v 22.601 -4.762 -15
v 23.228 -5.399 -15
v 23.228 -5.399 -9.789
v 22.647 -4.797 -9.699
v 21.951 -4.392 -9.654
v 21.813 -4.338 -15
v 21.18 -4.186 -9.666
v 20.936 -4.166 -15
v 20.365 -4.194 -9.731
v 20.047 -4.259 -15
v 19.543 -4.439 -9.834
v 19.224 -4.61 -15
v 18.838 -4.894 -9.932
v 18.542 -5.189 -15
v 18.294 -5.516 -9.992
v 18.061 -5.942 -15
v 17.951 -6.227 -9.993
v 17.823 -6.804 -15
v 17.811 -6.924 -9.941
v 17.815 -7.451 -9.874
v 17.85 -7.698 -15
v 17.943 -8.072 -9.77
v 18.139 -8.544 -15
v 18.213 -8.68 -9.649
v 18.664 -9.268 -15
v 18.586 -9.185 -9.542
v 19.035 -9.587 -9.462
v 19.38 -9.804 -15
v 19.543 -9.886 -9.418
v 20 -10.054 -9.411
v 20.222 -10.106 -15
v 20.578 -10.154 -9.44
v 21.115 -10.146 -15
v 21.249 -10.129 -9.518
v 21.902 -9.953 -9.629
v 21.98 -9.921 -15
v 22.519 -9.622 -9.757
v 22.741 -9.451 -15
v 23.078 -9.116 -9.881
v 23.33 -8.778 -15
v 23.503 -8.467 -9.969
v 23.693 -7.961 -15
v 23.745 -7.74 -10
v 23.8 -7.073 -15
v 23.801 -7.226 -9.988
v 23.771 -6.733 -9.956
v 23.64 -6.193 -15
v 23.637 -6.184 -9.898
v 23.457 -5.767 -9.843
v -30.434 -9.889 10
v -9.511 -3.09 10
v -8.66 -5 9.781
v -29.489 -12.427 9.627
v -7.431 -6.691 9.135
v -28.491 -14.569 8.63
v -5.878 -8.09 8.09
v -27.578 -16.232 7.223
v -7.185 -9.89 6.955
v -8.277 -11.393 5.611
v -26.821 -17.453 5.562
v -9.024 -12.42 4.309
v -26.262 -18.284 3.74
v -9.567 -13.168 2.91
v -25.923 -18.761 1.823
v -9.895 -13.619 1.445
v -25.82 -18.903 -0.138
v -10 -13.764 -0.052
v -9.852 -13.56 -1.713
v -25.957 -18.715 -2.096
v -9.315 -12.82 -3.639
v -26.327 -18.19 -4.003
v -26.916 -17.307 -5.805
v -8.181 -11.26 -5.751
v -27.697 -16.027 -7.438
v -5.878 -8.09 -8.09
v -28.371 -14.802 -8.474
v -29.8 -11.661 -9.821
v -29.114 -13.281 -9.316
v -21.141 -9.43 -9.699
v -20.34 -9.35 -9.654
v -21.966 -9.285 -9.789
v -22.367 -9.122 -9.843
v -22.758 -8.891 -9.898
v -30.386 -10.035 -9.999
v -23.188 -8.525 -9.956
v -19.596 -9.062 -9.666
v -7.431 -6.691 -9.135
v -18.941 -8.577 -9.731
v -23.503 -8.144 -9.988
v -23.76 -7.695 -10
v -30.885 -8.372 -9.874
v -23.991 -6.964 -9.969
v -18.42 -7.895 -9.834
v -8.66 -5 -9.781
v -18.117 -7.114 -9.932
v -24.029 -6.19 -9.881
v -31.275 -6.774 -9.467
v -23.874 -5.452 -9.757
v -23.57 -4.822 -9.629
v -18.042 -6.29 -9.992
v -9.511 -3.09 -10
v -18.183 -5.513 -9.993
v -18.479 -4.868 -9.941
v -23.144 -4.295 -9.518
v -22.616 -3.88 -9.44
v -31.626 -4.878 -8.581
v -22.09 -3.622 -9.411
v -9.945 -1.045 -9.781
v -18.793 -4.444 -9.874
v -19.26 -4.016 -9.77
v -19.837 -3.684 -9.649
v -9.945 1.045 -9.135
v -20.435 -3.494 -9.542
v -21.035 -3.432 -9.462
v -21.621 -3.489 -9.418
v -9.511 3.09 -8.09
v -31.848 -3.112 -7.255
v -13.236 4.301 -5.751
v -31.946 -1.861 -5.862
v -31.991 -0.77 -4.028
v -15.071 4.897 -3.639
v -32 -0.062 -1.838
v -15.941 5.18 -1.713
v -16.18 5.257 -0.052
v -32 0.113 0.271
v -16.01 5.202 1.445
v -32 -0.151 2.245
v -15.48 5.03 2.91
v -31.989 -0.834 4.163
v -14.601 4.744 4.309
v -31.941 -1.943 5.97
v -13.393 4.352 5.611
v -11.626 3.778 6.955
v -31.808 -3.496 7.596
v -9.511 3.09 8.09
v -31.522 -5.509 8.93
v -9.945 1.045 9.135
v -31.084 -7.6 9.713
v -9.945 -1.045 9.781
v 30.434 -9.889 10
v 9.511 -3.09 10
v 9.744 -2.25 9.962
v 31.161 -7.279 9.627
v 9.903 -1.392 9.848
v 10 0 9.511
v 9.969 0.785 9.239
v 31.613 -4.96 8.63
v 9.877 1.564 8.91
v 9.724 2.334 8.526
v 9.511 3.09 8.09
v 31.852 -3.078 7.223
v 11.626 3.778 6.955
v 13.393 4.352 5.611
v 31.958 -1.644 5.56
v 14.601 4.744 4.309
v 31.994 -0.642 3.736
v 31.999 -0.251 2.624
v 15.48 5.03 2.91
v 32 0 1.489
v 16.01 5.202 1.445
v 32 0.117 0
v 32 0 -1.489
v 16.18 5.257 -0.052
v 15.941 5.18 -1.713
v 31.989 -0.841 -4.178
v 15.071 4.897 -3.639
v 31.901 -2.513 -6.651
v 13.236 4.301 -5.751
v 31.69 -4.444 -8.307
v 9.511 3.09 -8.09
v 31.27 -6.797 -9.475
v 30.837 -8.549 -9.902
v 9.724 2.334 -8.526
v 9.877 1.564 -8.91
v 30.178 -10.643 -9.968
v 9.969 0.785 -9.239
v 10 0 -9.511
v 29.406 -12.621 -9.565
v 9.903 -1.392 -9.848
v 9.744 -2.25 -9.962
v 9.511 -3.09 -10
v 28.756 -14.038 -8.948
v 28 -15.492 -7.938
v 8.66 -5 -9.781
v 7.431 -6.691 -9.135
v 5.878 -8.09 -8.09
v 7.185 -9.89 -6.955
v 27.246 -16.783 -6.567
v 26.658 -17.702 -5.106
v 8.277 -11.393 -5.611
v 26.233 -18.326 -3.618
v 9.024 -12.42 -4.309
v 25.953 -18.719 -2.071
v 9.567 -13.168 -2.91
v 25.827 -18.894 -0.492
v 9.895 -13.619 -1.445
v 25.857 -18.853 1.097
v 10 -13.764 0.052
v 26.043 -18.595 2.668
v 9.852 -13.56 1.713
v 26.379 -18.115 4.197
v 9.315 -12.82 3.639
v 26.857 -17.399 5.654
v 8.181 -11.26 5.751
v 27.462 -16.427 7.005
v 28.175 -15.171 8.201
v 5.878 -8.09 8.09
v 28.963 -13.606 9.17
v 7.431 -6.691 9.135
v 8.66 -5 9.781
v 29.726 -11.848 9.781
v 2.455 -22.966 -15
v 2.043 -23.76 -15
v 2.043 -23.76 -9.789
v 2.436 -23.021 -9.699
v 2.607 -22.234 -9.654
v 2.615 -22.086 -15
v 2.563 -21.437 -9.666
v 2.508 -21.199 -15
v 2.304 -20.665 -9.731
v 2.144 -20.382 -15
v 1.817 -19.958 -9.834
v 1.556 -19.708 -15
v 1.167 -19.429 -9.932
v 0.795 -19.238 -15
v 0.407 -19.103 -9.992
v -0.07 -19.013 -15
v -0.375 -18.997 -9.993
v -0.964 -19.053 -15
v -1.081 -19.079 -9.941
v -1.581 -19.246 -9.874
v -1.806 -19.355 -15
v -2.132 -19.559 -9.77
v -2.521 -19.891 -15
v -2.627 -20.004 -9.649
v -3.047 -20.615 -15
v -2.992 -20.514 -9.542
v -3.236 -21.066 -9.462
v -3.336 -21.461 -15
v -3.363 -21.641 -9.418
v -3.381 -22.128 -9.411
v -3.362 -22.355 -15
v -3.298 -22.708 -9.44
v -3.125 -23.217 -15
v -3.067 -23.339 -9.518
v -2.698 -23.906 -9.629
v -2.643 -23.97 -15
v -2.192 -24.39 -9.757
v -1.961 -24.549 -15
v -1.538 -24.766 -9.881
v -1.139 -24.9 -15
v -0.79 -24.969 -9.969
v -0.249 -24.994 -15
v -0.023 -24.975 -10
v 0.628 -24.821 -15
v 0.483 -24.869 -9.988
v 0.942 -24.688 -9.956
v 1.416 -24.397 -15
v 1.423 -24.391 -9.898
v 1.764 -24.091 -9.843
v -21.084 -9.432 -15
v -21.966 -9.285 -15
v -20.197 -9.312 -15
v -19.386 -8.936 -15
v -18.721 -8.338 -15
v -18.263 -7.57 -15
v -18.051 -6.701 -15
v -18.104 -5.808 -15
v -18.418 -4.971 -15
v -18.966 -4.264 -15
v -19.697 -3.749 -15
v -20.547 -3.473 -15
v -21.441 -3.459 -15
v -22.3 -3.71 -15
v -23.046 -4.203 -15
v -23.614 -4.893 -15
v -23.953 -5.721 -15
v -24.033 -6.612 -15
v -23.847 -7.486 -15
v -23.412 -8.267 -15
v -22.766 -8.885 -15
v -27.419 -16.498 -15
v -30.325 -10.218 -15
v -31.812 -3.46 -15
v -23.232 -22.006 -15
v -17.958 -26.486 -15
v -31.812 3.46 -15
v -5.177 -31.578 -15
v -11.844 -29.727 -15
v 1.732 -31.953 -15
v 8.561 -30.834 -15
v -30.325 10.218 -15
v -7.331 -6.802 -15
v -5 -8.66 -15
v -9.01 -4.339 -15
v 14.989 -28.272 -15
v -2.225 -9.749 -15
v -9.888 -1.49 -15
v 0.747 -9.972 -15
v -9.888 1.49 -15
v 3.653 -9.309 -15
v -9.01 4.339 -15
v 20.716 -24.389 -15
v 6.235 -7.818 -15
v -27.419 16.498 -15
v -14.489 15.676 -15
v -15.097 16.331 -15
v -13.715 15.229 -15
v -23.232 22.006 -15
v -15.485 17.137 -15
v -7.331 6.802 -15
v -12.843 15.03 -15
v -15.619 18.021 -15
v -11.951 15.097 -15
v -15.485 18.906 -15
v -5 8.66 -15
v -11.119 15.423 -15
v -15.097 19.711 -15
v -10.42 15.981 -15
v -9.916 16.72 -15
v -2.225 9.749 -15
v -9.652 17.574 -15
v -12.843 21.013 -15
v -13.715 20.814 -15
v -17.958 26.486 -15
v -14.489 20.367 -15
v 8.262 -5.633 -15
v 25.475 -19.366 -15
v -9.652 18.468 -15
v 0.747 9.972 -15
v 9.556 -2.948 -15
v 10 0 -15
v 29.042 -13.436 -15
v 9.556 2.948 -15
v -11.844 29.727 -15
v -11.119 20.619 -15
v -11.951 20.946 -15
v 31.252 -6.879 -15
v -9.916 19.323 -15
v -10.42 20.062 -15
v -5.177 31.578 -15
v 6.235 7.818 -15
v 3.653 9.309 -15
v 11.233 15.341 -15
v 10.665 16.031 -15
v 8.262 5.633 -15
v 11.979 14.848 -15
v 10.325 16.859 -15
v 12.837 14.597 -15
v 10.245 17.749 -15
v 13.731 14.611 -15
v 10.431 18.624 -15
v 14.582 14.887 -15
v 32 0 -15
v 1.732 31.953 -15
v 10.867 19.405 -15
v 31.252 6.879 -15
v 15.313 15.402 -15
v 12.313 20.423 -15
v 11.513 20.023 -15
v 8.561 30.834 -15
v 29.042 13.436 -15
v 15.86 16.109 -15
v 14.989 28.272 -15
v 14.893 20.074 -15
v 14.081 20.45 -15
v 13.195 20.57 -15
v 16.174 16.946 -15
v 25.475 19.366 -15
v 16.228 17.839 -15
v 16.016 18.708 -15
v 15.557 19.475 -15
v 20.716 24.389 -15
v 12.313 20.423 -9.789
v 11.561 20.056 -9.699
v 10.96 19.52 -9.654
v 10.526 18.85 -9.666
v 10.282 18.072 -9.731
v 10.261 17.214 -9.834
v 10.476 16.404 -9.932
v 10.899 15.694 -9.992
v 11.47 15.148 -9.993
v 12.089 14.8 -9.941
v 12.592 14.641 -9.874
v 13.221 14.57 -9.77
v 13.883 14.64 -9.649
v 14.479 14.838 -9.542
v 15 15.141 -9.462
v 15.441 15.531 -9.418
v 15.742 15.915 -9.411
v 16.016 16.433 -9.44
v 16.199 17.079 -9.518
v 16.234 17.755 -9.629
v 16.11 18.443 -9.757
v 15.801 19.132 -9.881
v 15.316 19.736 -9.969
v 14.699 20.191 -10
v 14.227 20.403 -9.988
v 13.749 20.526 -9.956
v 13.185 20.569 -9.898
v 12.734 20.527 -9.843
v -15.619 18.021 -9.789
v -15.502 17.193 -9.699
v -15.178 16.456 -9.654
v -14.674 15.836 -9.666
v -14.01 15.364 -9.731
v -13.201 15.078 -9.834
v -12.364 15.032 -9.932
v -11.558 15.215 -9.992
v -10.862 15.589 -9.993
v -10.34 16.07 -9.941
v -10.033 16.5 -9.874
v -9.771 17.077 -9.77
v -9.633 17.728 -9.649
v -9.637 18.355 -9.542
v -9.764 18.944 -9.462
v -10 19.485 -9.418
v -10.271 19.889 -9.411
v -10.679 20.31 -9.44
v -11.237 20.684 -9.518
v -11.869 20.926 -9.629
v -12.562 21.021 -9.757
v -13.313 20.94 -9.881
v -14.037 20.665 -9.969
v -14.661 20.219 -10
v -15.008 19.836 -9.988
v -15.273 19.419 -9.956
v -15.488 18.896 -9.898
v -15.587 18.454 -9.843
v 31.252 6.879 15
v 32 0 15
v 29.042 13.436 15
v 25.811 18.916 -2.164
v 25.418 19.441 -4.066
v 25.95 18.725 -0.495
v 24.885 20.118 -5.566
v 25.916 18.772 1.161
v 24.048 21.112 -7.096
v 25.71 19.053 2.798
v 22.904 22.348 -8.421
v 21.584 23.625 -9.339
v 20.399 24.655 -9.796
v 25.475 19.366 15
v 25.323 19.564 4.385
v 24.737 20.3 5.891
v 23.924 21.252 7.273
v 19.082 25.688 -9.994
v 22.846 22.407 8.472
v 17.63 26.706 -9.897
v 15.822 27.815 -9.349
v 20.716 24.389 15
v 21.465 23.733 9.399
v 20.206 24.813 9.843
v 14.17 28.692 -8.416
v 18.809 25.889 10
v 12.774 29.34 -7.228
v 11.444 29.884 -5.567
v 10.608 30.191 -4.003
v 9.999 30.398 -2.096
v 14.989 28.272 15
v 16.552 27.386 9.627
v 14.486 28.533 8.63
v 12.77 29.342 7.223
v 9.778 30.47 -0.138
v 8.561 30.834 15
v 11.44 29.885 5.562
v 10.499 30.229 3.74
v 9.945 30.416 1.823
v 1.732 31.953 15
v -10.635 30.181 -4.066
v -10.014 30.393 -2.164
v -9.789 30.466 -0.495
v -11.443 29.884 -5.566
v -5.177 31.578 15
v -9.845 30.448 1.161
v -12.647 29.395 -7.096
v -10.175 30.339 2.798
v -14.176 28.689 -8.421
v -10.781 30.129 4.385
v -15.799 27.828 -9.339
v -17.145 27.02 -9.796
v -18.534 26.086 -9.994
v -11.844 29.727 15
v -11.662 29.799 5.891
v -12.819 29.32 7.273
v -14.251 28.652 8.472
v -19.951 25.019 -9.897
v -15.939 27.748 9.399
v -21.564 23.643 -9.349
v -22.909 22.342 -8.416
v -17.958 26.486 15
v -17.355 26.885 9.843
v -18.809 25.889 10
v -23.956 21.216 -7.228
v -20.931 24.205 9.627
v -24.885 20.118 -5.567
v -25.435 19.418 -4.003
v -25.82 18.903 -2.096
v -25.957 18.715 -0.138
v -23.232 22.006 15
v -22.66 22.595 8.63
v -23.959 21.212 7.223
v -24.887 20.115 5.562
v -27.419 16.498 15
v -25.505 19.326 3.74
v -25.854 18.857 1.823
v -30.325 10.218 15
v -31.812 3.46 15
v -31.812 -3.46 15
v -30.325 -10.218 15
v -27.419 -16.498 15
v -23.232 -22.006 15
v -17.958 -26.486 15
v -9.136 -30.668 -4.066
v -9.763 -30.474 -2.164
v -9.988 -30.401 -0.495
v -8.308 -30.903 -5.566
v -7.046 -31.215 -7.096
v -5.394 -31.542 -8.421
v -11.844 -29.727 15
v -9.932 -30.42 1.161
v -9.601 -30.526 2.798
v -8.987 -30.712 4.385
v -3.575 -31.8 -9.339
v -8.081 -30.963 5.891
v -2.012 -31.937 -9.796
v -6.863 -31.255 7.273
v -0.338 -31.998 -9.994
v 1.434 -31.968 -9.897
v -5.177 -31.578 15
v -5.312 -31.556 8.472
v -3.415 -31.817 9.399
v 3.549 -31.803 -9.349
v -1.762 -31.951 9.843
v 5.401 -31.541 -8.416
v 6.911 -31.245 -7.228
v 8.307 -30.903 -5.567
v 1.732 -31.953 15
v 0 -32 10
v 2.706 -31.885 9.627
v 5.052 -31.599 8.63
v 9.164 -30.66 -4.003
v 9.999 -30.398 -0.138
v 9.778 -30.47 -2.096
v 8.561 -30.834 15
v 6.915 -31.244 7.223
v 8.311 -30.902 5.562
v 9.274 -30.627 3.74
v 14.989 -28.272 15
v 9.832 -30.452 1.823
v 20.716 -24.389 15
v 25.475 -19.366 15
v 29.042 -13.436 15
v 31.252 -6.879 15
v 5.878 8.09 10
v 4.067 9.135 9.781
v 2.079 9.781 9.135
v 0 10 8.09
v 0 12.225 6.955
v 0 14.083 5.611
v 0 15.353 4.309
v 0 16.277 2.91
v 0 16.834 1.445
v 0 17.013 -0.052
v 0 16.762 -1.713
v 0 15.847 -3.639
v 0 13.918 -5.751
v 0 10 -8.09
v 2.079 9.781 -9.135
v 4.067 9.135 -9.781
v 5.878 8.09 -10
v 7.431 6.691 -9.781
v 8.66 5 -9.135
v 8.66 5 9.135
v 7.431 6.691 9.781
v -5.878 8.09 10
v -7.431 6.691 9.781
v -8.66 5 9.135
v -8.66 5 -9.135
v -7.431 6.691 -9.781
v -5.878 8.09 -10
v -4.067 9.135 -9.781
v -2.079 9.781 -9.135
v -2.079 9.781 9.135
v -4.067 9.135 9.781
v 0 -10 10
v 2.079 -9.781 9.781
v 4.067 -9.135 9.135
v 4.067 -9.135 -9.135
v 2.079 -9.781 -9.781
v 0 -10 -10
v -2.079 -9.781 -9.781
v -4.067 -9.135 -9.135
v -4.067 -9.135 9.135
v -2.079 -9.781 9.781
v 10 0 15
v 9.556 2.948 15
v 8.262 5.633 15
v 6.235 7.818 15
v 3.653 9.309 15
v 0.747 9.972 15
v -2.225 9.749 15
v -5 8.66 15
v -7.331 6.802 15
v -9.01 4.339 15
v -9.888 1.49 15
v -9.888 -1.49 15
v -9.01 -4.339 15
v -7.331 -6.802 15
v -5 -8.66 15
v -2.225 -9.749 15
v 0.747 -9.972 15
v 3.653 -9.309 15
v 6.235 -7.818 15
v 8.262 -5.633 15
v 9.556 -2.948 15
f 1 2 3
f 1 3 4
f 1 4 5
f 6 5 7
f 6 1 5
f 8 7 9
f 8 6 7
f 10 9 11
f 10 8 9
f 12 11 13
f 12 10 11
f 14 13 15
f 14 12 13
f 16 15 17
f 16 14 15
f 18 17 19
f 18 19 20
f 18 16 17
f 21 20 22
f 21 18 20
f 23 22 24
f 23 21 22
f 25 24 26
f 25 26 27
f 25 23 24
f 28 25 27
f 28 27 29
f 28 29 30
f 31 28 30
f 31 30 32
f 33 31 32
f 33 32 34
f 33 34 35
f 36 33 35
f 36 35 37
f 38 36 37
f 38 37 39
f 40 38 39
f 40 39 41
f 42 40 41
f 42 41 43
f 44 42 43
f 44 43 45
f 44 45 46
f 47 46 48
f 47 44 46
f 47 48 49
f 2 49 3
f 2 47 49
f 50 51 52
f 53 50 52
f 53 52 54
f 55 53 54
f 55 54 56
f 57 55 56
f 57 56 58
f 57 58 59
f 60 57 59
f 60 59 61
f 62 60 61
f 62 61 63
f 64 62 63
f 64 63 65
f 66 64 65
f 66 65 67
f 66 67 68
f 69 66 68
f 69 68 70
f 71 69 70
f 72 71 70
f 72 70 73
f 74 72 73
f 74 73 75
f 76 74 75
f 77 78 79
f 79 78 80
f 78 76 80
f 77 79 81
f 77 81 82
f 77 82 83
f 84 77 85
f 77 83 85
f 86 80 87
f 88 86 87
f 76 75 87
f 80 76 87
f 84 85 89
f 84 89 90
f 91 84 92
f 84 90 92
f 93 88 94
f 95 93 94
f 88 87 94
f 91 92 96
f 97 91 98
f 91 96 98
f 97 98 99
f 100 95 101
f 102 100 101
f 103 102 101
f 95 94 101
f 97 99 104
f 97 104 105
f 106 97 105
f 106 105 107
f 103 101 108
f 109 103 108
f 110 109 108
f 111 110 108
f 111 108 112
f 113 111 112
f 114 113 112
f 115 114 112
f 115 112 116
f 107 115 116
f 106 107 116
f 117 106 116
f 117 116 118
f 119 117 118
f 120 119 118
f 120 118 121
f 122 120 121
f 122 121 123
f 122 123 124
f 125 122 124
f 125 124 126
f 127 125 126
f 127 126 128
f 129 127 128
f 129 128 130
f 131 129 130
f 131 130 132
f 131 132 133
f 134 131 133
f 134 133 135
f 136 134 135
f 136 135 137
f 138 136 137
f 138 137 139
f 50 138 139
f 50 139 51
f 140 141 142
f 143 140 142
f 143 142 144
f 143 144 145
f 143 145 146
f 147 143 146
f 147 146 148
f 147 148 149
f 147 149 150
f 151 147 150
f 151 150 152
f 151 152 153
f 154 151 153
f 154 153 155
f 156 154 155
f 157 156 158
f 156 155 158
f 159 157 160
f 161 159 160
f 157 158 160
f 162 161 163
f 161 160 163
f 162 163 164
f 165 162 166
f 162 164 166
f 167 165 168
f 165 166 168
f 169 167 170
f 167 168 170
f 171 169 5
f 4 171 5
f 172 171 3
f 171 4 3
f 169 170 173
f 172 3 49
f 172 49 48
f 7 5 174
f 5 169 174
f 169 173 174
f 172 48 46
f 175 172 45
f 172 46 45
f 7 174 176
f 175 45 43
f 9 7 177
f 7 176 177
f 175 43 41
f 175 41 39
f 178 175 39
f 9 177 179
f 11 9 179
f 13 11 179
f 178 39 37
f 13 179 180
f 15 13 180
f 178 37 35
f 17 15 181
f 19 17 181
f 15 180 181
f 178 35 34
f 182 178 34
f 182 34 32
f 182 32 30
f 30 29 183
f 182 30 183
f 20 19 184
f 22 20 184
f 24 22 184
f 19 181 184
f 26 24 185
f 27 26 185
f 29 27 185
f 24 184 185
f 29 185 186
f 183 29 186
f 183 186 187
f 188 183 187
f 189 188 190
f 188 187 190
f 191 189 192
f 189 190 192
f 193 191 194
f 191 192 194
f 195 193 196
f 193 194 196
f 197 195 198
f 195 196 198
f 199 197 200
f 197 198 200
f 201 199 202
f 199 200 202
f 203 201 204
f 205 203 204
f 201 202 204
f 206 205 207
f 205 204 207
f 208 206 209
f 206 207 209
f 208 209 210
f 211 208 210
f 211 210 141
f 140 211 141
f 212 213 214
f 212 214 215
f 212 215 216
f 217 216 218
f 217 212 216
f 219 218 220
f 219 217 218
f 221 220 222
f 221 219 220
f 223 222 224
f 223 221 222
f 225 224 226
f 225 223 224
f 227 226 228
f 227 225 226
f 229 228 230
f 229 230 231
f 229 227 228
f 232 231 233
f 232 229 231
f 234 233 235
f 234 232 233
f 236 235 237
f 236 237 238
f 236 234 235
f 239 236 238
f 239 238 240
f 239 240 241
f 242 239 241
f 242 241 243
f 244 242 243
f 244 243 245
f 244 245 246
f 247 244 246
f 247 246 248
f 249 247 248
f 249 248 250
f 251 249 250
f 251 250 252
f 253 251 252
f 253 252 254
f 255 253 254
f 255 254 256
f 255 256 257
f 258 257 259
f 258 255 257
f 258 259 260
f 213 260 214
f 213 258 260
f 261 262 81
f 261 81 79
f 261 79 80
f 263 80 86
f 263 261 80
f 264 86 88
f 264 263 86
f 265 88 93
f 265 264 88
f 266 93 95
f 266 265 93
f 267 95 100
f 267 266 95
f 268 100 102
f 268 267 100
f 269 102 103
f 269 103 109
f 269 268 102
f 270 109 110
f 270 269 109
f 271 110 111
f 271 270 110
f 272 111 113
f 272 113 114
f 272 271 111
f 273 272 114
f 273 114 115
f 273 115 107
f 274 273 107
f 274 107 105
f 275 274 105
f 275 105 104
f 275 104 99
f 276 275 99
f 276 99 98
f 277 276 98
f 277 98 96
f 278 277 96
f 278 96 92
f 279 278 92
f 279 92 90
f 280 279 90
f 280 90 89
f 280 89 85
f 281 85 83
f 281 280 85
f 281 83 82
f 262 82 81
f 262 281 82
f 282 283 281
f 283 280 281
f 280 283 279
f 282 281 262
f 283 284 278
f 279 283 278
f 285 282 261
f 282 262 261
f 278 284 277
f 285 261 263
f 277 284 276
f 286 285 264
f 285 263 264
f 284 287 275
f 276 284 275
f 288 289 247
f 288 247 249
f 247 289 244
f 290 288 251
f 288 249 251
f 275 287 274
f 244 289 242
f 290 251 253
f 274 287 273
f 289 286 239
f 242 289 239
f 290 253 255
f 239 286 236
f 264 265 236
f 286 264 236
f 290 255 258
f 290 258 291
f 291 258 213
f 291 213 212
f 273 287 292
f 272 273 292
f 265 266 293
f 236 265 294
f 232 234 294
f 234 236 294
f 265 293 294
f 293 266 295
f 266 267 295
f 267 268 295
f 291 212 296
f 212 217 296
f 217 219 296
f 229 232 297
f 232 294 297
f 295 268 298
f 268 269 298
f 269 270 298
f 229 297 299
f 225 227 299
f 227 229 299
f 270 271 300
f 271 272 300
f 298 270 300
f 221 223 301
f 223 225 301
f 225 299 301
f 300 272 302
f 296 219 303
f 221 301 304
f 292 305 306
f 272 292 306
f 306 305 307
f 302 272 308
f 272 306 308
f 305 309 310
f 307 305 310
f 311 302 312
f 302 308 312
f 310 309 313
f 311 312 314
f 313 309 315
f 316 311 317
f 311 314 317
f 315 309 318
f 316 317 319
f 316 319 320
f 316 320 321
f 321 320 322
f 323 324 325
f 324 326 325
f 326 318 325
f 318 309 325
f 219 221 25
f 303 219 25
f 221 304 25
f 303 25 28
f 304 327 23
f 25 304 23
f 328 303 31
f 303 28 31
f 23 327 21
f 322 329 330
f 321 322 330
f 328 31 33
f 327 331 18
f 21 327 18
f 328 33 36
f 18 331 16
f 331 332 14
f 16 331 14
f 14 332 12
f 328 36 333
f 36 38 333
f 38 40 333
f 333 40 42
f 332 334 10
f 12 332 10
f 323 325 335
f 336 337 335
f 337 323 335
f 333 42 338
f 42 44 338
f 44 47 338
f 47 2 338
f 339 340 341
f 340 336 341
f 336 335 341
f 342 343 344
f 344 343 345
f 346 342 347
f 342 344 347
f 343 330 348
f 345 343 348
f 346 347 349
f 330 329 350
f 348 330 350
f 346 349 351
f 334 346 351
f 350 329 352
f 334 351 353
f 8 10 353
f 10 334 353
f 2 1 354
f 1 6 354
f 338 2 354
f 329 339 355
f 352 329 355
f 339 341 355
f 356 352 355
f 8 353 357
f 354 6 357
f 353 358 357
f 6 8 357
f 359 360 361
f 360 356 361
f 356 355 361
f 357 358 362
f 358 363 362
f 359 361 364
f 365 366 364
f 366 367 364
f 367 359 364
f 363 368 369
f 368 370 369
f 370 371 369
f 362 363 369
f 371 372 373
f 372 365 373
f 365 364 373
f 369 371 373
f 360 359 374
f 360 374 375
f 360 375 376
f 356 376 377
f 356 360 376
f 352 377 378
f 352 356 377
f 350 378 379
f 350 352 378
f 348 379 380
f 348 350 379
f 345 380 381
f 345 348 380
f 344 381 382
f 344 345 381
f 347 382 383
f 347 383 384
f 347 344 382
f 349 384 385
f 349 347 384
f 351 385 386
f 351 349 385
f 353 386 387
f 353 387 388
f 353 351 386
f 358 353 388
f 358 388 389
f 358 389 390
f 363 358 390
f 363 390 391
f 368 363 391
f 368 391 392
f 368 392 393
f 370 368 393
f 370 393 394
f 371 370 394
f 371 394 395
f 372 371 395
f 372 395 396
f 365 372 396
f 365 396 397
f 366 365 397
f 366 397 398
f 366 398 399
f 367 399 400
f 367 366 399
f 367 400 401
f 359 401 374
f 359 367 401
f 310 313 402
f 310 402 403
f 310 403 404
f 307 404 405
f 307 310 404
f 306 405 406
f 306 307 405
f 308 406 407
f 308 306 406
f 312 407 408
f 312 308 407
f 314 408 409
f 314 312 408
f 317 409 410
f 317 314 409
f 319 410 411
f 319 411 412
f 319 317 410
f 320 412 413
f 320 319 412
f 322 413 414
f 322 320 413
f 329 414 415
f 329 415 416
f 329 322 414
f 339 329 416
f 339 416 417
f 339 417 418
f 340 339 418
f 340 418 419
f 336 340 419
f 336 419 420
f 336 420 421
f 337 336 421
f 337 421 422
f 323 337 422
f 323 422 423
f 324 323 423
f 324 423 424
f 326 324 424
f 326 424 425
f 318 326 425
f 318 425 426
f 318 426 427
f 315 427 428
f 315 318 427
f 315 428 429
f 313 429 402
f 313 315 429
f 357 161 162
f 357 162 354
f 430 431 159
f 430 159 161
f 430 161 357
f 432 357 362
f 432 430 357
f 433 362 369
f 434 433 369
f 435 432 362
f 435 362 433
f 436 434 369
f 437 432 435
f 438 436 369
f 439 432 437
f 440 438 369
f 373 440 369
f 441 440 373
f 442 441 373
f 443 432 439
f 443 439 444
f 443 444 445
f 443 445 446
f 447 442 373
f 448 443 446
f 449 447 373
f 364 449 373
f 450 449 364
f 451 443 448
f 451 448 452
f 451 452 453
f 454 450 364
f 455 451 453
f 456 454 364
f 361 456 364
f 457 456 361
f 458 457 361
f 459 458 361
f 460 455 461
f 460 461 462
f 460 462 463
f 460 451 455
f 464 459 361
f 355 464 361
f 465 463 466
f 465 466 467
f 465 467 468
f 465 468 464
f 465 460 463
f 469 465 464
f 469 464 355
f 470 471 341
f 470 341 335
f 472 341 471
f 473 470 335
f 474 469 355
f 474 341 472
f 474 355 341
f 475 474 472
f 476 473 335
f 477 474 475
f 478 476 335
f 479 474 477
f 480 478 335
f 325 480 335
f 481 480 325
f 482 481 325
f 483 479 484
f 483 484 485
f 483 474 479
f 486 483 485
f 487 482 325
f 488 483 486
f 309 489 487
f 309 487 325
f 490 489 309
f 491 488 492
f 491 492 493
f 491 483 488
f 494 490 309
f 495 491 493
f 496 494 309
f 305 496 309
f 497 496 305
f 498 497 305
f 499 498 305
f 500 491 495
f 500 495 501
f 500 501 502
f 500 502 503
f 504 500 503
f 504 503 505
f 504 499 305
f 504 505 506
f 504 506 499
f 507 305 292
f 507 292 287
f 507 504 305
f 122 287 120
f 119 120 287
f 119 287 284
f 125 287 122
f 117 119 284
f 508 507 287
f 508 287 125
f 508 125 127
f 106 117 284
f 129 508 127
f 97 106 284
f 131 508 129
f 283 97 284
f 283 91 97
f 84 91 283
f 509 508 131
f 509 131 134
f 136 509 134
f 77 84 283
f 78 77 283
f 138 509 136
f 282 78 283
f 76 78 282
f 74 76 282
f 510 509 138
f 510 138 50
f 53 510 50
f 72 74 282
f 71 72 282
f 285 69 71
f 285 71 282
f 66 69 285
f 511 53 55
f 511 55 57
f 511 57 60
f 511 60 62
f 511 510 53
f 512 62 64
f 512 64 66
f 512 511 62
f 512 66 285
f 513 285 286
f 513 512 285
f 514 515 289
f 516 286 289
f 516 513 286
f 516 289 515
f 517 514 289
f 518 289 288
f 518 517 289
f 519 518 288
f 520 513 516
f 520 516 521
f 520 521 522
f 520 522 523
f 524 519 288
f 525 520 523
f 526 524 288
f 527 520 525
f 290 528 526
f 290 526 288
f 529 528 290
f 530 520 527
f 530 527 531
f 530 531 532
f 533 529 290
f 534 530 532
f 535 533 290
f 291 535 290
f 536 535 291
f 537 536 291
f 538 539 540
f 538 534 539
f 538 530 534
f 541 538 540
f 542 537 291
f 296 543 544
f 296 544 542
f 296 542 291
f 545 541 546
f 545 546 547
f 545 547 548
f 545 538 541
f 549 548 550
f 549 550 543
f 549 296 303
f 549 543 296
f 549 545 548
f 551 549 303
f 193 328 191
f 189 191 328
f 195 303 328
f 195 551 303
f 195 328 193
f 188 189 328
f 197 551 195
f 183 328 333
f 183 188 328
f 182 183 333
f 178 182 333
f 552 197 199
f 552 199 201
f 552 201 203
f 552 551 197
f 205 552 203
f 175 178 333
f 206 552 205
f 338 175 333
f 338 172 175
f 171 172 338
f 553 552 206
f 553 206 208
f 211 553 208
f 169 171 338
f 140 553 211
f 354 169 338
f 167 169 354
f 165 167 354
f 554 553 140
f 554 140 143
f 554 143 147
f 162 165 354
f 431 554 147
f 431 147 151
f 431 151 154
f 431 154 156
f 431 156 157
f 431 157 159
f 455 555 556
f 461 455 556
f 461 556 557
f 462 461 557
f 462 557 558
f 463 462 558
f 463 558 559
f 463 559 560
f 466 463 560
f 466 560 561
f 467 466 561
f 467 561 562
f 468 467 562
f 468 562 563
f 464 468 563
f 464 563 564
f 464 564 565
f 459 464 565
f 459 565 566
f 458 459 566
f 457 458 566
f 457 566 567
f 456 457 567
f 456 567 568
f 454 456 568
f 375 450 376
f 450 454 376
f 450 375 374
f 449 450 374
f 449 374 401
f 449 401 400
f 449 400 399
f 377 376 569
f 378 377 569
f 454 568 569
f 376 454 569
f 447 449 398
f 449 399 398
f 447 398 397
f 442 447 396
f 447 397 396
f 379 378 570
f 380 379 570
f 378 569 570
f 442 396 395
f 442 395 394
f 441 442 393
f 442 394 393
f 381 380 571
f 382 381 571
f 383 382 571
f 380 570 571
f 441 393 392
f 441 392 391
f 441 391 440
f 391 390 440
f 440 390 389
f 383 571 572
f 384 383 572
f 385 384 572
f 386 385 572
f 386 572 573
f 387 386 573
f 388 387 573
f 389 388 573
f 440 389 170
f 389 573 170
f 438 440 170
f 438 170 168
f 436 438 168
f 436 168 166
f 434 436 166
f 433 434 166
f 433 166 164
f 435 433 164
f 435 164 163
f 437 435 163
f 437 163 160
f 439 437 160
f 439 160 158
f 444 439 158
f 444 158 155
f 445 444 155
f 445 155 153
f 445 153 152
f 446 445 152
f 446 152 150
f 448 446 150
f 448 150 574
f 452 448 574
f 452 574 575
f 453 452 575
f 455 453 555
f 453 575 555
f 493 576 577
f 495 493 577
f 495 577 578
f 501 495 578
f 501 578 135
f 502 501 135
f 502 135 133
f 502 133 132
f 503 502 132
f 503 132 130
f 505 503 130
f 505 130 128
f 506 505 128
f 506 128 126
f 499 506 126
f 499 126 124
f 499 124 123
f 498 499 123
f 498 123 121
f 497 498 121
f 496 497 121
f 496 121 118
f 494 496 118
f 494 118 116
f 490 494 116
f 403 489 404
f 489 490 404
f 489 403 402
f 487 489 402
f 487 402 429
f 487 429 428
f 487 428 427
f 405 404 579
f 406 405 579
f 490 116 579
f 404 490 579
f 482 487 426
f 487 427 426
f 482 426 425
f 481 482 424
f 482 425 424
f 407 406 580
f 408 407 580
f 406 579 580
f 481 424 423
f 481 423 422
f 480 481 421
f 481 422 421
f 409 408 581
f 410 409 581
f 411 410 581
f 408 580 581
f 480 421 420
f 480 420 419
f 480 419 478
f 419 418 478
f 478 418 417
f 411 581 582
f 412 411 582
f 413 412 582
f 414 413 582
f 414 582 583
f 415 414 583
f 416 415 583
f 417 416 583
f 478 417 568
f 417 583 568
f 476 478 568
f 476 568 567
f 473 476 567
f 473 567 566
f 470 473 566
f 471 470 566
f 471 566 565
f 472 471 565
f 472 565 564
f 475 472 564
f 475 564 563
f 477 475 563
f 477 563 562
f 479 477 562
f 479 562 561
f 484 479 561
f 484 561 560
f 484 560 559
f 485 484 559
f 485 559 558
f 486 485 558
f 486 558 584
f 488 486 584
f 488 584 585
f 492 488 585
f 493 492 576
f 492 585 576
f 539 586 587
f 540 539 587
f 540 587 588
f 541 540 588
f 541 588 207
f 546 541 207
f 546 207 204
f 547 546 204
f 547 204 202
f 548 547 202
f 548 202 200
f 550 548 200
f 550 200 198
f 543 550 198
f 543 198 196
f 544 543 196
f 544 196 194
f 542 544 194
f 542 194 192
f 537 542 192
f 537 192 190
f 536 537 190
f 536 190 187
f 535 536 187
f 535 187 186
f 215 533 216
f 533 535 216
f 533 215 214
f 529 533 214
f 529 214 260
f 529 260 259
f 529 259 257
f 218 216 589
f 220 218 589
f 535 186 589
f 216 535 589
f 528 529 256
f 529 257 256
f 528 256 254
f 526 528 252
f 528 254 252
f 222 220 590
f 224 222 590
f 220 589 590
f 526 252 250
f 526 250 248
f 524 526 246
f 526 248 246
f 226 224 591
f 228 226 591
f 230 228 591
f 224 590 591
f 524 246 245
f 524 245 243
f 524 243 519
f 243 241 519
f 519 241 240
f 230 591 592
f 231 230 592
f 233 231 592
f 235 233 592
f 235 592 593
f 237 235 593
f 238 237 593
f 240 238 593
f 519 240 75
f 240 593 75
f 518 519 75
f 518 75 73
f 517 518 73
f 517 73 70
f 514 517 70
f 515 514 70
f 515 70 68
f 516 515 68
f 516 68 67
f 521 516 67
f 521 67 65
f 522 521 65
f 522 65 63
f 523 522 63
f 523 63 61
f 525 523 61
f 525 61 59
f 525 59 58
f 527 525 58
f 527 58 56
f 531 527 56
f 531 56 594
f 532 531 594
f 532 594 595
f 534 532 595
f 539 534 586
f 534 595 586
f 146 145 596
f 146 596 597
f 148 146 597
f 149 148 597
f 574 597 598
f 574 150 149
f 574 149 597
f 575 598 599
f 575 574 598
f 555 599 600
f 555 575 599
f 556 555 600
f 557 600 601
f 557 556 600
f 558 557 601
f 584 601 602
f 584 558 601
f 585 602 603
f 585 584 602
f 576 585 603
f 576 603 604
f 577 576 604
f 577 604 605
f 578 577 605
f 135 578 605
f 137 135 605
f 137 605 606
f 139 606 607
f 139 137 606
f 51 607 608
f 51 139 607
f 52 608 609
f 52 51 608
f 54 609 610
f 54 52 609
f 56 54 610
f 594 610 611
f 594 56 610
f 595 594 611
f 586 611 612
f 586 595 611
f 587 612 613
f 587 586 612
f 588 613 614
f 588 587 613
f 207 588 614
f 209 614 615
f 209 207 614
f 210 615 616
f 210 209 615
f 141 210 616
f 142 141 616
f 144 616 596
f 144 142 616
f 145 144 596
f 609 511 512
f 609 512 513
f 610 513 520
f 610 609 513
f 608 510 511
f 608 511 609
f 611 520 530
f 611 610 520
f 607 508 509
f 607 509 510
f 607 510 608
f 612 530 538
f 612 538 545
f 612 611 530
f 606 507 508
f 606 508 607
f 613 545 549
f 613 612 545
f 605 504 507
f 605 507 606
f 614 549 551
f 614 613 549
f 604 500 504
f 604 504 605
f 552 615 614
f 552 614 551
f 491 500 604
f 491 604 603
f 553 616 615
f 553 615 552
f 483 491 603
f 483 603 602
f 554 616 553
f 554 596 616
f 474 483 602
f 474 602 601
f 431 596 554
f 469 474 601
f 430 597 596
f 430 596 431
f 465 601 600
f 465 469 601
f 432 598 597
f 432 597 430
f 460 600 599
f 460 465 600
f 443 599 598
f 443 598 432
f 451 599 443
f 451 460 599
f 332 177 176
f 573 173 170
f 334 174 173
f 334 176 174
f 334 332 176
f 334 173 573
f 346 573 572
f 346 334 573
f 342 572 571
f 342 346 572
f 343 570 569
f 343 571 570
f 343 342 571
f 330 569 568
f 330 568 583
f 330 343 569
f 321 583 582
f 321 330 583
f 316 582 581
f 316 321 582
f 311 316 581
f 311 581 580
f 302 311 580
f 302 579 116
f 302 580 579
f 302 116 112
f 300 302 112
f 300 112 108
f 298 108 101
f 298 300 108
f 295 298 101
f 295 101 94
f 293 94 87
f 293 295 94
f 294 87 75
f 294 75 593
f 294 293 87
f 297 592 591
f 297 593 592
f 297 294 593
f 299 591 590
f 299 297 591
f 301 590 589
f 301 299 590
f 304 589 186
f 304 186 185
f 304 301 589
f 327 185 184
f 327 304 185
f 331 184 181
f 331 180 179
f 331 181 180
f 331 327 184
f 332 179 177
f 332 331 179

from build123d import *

# Parameters (mm, degrees)
SKETCH1_R           = 32
SKETCH1_R_2         = 10
BOSS_EXTRUDE1_DEPTH = 15
SKETCH2_R           = 10
CUT_EXTRUDE1_DEPTH  = 48.675989764
CIRPATTERN1_COUNT   = 5
SKETCH4_R           = 3
CUT_EXTRUDE3_DEPTH  = 11
CIRPATTERN2_COUNT   = 5


with BuildPart() as part:
    # Sketch1 → Boss-Extrude1 (new, symmetric)
    with BuildSketch(Plane.XY):
        Circle(SKETCH1_R)
        Circle(SKETCH1_R_2, mode=Mode.SUBTRACT)
    extrude(amount=BOSS_EXTRUDE1_DEPTH, both=True)

    # Sketch2 → Cut-Extrude1 (cut, through all)
    with BuildSketch(Plane(origin=(0, 0, 0), x_dir=(1, 0, 0), z_dir=(0, 1, 0))):
        with Locations(Location((0, 0, 0), (0, 0, 270))):
            Circle(SKETCH2_R)
    cut_extrude1 = extrude(amount=-CUT_EXTRUDE1_DEPTH, mode=Mode.SUBTRACT)

    # CirPattern1: Cut-Extrude1 ×5 about axis
    cirpattern1_axis = Axis((0, 0, 15), (0, 0, -1))
    for i in range(1, CIRPATTERN1_COUNT):
        add(cut_extrude1.rotate(cirpattern1_axis, i * 360 / CIRPATTERN1_COUNT), mode=Mode.SUBTRACT)

    # Sketch4 → Cut-Extrude3 (cut)
    with BuildSketch(Plane.XY.offset(-15)):
        with Locations(Location((-12.6186816, 18.021344974, 0), (0, 0, 180))):
            Circle(SKETCH4_R)
    cut_extrude3 = extrude(amount=CUT_EXTRUDE3_DEPTH, mode=Mode.SUBTRACT)

    # CirPattern2: Cut-Extrude3 ×5 about axis
    cirpattern2_axis = Axis((0, 0, 0), (0, 0, 1))
    for i in range(1, CIRPATTERN2_COUNT):
        add(cut_extrude3.rotate(cirpattern2_axis, i * 360 / CIRPATTERN2_COUNT), mode=Mode.SUBTRACT)


solid = part.part
